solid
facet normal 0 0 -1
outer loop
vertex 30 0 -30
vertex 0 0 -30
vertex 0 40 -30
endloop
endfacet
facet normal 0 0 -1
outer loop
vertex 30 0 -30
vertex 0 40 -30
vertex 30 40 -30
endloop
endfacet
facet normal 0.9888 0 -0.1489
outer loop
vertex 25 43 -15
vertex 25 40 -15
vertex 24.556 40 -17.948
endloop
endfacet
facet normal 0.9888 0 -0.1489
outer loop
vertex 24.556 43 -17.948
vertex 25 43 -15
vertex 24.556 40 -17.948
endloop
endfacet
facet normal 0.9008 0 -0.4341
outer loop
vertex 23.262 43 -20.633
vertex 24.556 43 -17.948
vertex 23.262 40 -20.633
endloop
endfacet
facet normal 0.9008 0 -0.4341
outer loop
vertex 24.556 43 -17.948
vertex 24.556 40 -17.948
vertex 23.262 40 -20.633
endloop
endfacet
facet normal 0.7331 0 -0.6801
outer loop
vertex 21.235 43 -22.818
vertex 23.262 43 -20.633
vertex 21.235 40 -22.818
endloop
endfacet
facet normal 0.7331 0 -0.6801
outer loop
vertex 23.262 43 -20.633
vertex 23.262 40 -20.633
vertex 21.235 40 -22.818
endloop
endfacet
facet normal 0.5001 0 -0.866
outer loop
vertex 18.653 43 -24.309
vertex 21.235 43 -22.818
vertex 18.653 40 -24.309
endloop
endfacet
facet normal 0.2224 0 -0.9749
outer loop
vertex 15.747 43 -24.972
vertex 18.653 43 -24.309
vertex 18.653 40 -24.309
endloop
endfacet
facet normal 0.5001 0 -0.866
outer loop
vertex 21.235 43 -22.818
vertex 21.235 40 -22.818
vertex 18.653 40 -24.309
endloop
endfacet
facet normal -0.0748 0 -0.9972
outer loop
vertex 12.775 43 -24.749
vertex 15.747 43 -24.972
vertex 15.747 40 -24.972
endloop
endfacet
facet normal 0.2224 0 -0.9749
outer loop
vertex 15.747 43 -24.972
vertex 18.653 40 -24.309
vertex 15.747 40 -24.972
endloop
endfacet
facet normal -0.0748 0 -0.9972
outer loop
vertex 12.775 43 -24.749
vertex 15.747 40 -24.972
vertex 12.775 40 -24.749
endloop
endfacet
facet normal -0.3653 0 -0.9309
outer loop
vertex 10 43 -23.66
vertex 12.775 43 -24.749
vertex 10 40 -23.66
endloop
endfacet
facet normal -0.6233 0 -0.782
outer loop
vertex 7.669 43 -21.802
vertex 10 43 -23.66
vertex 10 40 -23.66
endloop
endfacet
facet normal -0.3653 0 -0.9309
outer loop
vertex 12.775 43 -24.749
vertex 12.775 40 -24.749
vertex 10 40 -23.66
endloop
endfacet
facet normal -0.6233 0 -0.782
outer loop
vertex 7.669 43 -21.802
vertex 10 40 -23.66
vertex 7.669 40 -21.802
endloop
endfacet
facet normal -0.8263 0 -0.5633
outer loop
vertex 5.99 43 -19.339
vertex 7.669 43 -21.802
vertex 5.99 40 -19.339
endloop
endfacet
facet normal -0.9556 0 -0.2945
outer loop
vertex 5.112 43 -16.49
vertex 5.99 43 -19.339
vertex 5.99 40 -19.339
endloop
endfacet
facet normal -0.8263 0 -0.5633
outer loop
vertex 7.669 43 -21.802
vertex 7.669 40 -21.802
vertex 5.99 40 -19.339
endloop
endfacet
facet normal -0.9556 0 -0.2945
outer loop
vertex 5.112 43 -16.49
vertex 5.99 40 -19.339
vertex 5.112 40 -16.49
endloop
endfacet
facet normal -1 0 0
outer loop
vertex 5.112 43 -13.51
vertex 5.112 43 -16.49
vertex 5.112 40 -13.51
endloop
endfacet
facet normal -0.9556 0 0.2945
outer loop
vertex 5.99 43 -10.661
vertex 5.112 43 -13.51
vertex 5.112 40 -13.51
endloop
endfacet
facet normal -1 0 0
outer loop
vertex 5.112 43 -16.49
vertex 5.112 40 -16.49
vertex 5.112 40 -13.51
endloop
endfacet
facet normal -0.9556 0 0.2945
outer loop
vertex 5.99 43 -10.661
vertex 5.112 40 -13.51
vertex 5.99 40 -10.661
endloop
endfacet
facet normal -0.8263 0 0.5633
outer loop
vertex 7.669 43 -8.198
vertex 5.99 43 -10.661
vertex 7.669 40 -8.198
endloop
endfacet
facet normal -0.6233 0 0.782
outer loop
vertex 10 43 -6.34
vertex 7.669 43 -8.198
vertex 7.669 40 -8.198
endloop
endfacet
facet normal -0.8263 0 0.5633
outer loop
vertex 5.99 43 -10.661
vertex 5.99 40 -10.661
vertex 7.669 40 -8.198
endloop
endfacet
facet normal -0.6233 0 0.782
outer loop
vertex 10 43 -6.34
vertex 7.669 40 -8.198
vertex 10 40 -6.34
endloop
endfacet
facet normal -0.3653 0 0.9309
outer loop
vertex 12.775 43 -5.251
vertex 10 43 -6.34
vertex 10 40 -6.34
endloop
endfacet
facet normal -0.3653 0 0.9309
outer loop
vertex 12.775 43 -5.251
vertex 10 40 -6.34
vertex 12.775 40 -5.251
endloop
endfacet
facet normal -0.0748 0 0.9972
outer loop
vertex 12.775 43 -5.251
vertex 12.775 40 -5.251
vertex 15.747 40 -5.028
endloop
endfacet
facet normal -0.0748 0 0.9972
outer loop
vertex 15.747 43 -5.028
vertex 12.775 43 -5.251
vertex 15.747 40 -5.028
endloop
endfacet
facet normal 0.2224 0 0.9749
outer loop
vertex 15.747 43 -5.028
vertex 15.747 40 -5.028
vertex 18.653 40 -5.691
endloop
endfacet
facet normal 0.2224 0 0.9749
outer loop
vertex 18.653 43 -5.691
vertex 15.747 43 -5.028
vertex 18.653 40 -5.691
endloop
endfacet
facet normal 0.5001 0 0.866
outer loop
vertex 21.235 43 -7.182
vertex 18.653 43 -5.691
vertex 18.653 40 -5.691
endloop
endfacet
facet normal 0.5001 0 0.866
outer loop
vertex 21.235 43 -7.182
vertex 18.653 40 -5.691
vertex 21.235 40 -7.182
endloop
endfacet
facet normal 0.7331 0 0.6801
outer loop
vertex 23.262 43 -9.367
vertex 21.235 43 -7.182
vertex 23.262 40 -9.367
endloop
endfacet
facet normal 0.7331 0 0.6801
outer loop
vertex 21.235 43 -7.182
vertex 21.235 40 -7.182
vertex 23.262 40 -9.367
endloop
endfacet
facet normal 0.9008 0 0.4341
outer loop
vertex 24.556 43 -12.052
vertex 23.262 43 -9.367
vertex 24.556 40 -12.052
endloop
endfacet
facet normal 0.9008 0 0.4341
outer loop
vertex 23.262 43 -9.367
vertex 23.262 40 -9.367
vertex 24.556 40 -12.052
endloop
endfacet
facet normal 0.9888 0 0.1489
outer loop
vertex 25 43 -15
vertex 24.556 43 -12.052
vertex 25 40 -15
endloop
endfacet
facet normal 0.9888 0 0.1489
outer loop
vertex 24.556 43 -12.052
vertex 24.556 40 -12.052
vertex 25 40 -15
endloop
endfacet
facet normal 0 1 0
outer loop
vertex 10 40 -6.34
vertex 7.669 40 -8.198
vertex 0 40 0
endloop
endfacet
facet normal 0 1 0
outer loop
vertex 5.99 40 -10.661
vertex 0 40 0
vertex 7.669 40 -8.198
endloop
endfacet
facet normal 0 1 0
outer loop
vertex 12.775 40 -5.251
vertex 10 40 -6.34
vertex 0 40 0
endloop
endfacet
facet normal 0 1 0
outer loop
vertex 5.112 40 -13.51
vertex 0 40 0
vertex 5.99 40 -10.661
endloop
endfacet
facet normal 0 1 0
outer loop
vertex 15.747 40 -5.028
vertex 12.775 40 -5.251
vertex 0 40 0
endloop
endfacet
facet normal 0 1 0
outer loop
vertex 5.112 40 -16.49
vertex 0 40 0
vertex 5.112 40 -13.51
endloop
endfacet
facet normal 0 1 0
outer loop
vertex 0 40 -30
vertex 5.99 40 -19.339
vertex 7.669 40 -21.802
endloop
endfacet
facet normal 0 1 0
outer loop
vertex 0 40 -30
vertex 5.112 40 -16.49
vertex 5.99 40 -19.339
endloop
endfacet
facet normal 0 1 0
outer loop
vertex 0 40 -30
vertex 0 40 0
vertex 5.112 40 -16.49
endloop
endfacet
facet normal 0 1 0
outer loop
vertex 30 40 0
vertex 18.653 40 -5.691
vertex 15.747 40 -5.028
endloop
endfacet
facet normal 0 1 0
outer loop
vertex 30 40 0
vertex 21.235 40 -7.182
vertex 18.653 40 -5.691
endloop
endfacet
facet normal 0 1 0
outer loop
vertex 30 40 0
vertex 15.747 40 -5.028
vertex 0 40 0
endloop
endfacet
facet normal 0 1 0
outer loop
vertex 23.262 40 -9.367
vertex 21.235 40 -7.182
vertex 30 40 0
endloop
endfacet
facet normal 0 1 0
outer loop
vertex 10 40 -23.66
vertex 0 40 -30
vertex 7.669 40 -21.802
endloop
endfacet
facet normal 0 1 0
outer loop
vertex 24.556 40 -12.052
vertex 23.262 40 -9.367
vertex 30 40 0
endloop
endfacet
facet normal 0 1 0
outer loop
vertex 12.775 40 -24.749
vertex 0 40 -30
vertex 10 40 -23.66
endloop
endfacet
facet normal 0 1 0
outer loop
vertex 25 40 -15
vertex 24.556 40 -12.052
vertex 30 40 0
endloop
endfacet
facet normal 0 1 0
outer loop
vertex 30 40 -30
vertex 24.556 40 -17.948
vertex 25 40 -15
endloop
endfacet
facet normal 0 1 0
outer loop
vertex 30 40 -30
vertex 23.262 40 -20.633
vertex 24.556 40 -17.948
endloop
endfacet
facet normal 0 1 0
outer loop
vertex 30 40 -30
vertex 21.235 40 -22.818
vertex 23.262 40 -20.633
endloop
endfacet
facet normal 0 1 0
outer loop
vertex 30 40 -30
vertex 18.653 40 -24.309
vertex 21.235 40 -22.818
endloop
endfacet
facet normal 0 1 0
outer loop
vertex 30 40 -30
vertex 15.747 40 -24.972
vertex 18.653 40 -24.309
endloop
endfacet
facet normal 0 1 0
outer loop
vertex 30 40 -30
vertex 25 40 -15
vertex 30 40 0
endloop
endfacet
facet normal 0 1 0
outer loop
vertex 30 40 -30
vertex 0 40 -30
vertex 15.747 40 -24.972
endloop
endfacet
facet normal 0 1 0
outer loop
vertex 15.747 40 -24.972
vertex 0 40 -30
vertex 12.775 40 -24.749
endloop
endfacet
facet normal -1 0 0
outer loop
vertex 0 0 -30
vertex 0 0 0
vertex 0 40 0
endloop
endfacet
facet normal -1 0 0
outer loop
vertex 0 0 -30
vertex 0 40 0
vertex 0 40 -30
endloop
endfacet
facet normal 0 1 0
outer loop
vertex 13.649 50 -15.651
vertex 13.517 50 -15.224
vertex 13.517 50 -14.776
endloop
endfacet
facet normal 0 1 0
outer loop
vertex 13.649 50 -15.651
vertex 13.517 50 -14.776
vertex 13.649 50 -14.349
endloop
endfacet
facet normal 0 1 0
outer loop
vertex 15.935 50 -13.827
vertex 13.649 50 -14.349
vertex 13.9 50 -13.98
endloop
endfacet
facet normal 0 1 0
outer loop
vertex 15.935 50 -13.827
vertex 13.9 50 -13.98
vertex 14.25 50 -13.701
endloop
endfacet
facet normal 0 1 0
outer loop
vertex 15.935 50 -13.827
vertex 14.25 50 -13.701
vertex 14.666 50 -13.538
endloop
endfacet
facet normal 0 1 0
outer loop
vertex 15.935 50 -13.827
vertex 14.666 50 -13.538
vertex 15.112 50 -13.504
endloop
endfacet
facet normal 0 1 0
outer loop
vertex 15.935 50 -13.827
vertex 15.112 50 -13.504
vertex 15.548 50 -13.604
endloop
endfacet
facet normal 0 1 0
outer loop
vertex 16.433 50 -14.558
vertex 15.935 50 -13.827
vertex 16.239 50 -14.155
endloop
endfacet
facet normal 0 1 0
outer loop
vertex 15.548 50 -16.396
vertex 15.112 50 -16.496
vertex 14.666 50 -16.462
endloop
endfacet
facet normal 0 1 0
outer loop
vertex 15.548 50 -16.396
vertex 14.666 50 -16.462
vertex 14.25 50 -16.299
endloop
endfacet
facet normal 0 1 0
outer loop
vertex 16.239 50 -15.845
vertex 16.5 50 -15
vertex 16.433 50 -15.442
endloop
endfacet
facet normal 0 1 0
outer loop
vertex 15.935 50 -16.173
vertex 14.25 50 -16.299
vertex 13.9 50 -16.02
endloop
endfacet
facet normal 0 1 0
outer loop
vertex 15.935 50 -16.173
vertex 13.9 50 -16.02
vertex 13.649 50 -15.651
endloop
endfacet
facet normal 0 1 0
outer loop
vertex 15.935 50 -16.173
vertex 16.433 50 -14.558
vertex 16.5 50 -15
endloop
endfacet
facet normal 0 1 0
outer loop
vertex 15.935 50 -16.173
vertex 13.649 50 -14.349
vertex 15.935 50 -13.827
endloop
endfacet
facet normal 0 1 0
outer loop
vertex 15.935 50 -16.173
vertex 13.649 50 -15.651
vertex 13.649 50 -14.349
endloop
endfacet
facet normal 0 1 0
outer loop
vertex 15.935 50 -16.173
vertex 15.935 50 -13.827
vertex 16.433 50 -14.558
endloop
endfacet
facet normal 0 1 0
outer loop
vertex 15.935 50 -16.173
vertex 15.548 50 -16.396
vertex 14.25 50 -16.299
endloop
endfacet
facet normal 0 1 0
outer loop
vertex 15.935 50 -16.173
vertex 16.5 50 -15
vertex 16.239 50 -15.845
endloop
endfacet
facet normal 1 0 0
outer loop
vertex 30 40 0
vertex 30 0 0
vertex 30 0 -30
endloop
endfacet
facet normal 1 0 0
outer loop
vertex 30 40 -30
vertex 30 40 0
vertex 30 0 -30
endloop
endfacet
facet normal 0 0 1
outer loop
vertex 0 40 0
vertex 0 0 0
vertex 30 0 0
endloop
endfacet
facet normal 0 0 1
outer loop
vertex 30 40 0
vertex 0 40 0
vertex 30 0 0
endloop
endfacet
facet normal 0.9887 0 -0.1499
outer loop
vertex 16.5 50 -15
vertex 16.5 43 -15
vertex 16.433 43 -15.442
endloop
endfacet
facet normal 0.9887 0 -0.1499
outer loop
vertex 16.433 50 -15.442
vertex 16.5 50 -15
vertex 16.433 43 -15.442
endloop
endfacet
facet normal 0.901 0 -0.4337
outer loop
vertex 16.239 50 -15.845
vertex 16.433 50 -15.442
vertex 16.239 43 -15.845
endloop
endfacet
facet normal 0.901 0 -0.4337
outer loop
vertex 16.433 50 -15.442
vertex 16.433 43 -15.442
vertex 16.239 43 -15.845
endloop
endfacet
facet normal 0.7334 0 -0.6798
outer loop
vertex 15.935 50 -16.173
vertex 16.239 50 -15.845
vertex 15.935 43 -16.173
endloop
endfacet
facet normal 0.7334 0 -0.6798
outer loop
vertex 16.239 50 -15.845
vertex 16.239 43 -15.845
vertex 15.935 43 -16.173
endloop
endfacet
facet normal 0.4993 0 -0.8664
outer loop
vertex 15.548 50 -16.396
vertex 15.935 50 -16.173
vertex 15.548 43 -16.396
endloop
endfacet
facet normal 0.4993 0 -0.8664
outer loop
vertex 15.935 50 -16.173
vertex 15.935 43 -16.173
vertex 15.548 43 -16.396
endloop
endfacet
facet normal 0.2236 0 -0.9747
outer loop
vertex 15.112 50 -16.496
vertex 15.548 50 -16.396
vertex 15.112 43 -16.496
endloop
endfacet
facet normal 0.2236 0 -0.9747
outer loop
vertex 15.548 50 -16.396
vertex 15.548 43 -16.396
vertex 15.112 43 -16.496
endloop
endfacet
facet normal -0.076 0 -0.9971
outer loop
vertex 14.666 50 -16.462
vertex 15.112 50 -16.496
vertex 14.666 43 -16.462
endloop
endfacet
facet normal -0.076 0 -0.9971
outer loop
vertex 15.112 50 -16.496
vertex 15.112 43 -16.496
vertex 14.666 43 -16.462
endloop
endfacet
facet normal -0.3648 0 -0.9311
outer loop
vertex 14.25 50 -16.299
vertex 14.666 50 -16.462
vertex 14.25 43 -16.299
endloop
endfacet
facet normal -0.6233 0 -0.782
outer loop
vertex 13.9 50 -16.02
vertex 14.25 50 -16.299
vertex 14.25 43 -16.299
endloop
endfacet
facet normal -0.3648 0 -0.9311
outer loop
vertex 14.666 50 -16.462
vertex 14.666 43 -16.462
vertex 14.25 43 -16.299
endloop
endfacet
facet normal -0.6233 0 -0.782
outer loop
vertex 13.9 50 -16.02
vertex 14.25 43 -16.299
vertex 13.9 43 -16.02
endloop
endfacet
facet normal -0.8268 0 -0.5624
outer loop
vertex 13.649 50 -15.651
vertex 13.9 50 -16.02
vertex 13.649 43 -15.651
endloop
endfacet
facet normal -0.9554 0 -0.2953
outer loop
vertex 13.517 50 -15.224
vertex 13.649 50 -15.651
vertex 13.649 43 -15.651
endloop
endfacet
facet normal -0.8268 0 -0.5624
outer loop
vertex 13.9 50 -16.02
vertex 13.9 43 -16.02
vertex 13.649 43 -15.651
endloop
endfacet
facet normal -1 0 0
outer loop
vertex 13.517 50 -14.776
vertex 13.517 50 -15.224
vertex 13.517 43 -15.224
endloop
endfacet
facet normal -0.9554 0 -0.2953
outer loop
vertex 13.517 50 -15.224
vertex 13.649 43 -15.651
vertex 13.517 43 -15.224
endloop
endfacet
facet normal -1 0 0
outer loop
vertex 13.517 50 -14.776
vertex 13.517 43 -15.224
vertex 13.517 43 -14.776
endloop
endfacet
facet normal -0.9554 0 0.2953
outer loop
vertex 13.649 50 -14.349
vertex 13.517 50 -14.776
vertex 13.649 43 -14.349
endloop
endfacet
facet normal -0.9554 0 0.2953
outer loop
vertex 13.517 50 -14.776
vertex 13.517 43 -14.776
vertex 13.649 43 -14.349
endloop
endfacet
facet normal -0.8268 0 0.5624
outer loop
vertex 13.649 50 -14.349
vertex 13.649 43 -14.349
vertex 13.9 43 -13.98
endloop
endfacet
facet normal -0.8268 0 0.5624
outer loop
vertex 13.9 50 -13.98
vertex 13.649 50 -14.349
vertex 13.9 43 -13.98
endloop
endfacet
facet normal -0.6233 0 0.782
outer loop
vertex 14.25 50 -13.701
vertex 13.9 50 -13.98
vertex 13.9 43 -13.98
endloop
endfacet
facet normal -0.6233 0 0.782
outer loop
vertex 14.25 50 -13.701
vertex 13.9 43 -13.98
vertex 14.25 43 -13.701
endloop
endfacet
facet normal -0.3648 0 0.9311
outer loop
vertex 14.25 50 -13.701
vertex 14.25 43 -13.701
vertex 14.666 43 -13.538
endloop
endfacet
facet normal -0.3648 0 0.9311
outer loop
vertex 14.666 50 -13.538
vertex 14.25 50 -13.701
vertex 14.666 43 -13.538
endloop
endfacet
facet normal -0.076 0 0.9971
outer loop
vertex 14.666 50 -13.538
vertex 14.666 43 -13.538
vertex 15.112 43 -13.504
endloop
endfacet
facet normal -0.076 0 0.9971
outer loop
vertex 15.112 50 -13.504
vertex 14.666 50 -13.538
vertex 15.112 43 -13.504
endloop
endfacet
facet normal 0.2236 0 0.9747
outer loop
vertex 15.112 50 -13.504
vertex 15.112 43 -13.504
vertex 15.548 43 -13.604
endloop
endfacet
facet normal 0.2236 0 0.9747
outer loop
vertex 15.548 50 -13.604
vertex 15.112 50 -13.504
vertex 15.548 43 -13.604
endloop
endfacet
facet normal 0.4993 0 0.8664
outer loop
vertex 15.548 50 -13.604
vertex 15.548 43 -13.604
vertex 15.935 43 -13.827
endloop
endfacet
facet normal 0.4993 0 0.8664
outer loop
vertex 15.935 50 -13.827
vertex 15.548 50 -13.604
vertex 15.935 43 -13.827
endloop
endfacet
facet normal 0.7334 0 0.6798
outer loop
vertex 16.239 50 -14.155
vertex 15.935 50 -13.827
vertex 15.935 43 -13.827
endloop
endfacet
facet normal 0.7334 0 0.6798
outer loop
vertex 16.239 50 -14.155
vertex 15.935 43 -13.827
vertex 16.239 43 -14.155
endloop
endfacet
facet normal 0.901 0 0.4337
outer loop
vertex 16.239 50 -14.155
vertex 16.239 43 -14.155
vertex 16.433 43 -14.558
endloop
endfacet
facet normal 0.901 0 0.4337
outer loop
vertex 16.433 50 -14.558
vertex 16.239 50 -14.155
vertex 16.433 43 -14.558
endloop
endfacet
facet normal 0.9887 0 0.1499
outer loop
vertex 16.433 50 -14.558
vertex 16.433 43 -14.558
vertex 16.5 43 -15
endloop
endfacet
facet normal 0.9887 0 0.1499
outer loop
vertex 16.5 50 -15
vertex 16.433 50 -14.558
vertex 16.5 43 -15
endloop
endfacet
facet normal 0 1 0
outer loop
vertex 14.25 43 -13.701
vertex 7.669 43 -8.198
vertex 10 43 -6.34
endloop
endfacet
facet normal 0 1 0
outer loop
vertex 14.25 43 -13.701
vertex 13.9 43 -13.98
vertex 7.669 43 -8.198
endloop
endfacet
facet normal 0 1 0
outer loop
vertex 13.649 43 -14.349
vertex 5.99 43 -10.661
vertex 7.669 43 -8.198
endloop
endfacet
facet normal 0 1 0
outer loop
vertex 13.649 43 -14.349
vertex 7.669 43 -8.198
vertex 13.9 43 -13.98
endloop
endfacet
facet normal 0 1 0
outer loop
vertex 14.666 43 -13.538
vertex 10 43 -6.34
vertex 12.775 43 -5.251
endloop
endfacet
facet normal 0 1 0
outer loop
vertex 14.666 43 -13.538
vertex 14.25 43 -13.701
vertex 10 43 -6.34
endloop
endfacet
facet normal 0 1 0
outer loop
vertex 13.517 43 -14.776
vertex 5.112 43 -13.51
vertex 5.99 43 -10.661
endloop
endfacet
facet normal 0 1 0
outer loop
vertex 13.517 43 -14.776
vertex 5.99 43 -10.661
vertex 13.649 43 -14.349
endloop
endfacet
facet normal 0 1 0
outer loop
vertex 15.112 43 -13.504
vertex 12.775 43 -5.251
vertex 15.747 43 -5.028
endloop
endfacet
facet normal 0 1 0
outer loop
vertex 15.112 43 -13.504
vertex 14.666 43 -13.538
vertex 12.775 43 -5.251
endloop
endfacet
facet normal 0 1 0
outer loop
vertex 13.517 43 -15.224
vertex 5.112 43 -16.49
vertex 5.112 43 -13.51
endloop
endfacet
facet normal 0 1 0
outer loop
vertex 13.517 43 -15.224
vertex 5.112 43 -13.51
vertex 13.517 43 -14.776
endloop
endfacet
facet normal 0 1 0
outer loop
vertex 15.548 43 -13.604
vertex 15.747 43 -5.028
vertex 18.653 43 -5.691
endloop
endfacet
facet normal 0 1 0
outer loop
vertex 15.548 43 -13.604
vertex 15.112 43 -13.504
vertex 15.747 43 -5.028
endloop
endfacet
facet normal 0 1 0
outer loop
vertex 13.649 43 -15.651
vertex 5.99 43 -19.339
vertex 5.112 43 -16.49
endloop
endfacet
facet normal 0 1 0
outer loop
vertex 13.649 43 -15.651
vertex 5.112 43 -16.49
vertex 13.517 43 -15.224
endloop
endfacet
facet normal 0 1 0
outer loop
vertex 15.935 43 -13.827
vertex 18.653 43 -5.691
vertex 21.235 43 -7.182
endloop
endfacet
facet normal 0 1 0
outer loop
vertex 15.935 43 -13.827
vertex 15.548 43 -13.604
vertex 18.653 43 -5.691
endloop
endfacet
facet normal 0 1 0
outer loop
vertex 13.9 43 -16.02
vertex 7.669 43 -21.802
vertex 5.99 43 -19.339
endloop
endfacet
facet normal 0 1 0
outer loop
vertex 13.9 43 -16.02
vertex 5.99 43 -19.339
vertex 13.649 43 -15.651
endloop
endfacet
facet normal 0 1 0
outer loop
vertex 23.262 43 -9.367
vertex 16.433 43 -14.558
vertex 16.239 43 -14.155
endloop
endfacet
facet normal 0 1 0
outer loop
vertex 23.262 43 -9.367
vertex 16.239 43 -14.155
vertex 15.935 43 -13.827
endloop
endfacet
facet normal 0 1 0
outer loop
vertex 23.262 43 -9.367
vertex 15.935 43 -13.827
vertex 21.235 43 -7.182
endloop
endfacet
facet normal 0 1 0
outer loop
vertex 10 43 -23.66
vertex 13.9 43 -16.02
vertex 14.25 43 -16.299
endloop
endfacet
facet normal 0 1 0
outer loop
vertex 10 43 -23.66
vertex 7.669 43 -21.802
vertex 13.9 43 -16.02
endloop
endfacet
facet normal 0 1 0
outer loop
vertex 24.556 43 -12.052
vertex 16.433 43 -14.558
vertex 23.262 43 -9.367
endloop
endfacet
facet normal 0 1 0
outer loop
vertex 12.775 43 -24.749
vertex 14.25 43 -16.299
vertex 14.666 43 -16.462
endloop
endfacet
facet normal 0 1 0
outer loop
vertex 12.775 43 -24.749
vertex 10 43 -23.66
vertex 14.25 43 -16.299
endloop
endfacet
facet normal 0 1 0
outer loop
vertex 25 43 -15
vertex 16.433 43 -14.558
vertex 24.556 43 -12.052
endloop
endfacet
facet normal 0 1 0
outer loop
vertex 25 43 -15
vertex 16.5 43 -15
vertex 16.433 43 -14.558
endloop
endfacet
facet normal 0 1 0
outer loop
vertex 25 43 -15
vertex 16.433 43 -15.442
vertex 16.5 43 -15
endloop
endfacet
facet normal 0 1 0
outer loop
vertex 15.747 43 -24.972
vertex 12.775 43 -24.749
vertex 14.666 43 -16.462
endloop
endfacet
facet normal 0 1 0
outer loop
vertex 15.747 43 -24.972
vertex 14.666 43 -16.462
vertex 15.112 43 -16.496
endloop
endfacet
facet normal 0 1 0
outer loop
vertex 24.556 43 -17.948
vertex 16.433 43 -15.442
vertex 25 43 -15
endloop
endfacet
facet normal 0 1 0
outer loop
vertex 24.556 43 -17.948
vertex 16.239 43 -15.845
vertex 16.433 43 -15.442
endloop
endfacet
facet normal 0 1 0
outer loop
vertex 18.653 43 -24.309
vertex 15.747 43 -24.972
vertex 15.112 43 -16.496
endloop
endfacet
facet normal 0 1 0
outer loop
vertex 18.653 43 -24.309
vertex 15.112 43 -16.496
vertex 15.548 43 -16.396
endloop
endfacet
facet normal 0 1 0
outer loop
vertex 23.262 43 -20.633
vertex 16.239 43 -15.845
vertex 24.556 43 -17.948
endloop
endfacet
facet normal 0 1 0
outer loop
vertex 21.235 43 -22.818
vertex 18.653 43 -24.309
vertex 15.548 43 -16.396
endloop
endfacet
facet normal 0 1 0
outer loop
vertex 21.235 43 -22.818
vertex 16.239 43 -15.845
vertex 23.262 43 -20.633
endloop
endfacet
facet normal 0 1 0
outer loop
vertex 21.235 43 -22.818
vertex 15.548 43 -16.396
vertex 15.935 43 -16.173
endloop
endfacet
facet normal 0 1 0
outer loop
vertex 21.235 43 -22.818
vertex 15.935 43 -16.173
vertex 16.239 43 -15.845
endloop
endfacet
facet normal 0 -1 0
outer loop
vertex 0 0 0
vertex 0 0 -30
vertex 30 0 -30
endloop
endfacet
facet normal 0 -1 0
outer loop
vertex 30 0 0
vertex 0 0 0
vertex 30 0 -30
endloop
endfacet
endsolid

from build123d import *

# Parameters (mm, degrees)
SKETCH1_W           = 30
SKETCH1_H           = 30
BOSS_EXTRUDE1_DEPTH = 40
SKETCH2_R           = 1.5
BOSS_EXTRUDE2_DEPTH = 10
SKETCH4_R           = 10
BOSS_EXTRUDE3_DEPTH = 3


with BuildPart() as part:
    # Sketch1 → Boss-Extrude1 (new body)
    with BuildSketch(Plane(origin=(0, 0, 0), x_dir=(1, 0, 0), z_dir=(0, 1, 0))):
        with Locations((15, 15)):
            Rectangle(SKETCH1_W, SKETCH1_H)
    extrude(amount=BOSS_EXTRUDE1_DEPTH)

    # Sketch2 → Boss-Extrude2 (add)
    with BuildSketch(Plane(origin=(0, 40, 0), x_dir=(1, 0, 0), z_dir=(0, 1, 0))):
        with Locations((15, 15)):
            Circle(SKETCH2_R)
    extrude(amount=BOSS_EXTRUDE2_DEPTH)

    # Sketch4 → Boss-Extrude3 (add)
    with BuildSketch(Plane(origin=(0, 40, 0), x_dir=(1, 0, 0), z_dir=(0, 1, 0))):
        with Locations((15, 15)):
            Circle(SKETCH4_R)
    extrude(amount=BOSS_EXTRUDE3_DEPTH)


solid = part.part
